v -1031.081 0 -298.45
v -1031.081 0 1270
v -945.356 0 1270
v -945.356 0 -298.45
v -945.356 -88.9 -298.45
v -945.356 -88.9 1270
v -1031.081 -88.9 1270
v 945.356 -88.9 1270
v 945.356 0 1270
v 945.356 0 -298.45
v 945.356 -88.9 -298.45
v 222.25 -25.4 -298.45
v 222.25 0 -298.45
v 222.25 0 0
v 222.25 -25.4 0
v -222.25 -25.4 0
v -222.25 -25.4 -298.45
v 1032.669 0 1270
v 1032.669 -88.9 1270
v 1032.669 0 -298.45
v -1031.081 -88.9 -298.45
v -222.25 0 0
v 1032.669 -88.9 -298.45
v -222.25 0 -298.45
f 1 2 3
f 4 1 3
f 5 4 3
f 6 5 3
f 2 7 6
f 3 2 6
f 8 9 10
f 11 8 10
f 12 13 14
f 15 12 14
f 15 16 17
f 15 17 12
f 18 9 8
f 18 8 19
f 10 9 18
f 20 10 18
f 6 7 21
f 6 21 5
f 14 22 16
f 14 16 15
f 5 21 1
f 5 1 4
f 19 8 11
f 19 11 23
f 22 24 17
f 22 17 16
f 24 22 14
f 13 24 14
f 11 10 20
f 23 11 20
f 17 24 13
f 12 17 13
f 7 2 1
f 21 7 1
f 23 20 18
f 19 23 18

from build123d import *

# Parameters (mm, degrees)
F0_W     = 85.725
F0_H     = 1270
F0_H_2   = 298.45
F0_W_2   = 87.3125
F1_DEPTH = 88.9
F2_W     = 444.5
F2_H     = 298.45
F3_DEPTH = 25.4


with BuildPart() as f1:
    # F0 (on Front) → F1 (new body)
    with BuildSketch(Plane.XZ):
        with Locations((-988.21875, 635)):
            Rectangle(F0_W, F0_H)
        with Locations((-988.21875, -149.225)):
            Rectangle(F0_W, F0_H_2)
        with Locations((989.0125, 635)):
            Rectangle(F0_W_2, F0_H)
        with Locations((989.0125, -149.225)):
            Rectangle(F0_W_2, F0_H_2)
    extrude(amount=F1_DEPTH)


with BuildPart() as f3:
    # F2 (on Front) → F3 (new body)
    with BuildSketch(Plane.XZ):
        with Locations((0, -149.225)):
            Rectangle(F2_W, F2_H)
    extrude(amount=F3_DEPTH)


solid = Compound([f1.part, f3.part])
